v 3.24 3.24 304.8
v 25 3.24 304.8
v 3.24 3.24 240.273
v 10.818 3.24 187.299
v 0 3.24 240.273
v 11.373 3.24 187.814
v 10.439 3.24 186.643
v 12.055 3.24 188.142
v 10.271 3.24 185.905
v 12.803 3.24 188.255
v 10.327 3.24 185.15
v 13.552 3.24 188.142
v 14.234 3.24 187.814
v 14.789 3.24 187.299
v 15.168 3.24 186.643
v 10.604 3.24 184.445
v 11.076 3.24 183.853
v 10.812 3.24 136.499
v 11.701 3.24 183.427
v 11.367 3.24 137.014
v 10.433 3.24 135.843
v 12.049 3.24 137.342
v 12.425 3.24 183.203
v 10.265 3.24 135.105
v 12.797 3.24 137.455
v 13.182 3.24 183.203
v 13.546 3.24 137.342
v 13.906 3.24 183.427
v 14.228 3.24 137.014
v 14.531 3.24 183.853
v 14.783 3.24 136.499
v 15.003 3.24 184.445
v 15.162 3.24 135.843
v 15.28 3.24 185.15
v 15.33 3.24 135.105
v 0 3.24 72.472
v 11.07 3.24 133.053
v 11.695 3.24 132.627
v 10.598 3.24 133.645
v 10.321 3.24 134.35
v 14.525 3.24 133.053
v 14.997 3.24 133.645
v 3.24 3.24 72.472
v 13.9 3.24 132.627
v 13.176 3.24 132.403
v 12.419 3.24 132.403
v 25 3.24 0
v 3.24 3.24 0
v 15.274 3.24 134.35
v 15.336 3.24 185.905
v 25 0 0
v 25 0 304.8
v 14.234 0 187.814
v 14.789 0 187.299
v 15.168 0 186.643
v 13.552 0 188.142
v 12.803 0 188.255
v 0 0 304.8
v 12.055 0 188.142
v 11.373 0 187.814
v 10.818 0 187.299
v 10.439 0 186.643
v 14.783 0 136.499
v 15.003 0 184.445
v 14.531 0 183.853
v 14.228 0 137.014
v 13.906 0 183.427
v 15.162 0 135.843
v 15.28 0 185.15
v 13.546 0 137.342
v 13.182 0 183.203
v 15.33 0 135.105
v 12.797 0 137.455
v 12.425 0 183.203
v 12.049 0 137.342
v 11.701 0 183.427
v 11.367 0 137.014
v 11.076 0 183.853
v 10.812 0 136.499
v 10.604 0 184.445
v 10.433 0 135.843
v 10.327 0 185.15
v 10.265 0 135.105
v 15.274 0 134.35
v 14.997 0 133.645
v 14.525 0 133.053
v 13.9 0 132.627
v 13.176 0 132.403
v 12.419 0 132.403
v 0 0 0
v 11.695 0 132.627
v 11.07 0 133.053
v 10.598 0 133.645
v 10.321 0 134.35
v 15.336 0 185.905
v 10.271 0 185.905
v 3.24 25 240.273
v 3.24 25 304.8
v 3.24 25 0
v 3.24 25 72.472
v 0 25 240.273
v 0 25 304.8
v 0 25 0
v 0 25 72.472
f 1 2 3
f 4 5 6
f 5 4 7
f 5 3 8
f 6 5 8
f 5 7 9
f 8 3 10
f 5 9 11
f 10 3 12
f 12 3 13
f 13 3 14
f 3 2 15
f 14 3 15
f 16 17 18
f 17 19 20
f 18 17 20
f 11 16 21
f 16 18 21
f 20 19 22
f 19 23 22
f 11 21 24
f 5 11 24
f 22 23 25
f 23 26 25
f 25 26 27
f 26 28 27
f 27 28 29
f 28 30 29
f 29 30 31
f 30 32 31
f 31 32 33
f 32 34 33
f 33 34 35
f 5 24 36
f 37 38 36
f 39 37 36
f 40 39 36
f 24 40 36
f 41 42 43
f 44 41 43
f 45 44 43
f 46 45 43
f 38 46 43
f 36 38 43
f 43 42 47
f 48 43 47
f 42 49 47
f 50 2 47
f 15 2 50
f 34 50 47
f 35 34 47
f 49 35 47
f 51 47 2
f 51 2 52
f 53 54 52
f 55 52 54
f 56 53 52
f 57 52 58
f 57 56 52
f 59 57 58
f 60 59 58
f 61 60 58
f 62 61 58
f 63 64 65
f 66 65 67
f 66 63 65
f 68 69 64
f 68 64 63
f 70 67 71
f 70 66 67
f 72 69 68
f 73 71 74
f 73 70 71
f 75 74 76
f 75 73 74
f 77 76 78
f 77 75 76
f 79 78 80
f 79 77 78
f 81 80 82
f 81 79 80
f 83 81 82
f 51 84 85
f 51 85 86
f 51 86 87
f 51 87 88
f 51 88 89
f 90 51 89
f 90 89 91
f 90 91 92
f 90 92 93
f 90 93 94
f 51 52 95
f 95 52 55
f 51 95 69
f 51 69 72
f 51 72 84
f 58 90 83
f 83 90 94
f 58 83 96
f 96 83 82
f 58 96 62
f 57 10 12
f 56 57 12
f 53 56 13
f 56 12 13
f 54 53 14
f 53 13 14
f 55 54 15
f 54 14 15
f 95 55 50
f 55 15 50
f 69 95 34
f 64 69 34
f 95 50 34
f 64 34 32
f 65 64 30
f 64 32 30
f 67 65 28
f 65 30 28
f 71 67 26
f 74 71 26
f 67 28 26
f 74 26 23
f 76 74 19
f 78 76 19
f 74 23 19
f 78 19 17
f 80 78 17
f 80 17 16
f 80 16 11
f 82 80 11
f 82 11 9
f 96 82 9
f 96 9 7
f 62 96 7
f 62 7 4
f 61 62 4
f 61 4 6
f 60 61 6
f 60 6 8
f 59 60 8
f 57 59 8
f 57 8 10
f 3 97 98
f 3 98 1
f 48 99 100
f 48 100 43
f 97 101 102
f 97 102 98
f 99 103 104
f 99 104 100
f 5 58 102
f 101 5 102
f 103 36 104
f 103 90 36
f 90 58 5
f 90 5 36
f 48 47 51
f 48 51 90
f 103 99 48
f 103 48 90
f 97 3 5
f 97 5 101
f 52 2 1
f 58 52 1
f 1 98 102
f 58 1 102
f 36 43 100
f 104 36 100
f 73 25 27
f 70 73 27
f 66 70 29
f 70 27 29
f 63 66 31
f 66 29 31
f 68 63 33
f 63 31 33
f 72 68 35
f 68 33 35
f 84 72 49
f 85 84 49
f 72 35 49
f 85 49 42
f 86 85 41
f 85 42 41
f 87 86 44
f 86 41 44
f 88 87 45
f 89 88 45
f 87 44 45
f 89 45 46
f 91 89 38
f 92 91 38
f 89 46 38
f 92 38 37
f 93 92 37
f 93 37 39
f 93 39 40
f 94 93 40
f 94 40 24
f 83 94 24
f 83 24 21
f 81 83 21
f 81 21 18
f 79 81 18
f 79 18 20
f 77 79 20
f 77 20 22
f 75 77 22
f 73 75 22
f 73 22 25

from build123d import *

# Parameters (mm, degrees)
EXTRUDE_1_DEPTH     = 304.8
SKETCH_2_W          = 167.801792078
SKETCH_2_H          = 21.76
CUT_EXTRUDE_1_DEPTH = 304.8
SKETCH_4_R          = 2.54
CUT_EXTRUDE_2_DEPTH = 304.8


with BuildPart() as part:
    # 草图1 → 凸台-拉伸1 (new body)
    with BuildSketch(Plane.XY):
        Polygon((0, 0), (0, 25), (3.24, 25), (3.24, 3.24), (25, 3.24), (25, 0), align=None)
    extrude(amount=EXTRUDE_1_DEPTH)

    # 草图2 → 切除-拉伸1 (cut)
    with BuildSketch(Plane(origin=(3.24, 0, 0), x_dir=(0, 0, -1), z_dir=(1, 0, 0))):
        with Locations((-156.372580305, 14.12)):
            Rectangle(SKETCH_2_W, SKETCH_2_H)
    extrude(amount=-CUT_EXTRUDE_1_DEPTH, mode=Mode.SUBTRACT)

    # 草图4 → 切除-拉伸2 (cut)
    with BuildSketch(Plane(origin=(0, 3.24, 0), x_dir=(1, 0, 0), z_dir=(0, 1, 0))):
        with Locations(Location((12.797495231, -134.915130156, 0), (0, 0, 270))):
            Circle(SKETCH_4_R)
        with Locations(Location((12.803446161, -185.715129807, 0), (0, 0, 270))):
            Circle(SKETCH_4_R)
    extrude(amount=-CUT_EXTRUDE_2_DEPTH, mode=Mode.SUBTRACT)


solid = part.part
